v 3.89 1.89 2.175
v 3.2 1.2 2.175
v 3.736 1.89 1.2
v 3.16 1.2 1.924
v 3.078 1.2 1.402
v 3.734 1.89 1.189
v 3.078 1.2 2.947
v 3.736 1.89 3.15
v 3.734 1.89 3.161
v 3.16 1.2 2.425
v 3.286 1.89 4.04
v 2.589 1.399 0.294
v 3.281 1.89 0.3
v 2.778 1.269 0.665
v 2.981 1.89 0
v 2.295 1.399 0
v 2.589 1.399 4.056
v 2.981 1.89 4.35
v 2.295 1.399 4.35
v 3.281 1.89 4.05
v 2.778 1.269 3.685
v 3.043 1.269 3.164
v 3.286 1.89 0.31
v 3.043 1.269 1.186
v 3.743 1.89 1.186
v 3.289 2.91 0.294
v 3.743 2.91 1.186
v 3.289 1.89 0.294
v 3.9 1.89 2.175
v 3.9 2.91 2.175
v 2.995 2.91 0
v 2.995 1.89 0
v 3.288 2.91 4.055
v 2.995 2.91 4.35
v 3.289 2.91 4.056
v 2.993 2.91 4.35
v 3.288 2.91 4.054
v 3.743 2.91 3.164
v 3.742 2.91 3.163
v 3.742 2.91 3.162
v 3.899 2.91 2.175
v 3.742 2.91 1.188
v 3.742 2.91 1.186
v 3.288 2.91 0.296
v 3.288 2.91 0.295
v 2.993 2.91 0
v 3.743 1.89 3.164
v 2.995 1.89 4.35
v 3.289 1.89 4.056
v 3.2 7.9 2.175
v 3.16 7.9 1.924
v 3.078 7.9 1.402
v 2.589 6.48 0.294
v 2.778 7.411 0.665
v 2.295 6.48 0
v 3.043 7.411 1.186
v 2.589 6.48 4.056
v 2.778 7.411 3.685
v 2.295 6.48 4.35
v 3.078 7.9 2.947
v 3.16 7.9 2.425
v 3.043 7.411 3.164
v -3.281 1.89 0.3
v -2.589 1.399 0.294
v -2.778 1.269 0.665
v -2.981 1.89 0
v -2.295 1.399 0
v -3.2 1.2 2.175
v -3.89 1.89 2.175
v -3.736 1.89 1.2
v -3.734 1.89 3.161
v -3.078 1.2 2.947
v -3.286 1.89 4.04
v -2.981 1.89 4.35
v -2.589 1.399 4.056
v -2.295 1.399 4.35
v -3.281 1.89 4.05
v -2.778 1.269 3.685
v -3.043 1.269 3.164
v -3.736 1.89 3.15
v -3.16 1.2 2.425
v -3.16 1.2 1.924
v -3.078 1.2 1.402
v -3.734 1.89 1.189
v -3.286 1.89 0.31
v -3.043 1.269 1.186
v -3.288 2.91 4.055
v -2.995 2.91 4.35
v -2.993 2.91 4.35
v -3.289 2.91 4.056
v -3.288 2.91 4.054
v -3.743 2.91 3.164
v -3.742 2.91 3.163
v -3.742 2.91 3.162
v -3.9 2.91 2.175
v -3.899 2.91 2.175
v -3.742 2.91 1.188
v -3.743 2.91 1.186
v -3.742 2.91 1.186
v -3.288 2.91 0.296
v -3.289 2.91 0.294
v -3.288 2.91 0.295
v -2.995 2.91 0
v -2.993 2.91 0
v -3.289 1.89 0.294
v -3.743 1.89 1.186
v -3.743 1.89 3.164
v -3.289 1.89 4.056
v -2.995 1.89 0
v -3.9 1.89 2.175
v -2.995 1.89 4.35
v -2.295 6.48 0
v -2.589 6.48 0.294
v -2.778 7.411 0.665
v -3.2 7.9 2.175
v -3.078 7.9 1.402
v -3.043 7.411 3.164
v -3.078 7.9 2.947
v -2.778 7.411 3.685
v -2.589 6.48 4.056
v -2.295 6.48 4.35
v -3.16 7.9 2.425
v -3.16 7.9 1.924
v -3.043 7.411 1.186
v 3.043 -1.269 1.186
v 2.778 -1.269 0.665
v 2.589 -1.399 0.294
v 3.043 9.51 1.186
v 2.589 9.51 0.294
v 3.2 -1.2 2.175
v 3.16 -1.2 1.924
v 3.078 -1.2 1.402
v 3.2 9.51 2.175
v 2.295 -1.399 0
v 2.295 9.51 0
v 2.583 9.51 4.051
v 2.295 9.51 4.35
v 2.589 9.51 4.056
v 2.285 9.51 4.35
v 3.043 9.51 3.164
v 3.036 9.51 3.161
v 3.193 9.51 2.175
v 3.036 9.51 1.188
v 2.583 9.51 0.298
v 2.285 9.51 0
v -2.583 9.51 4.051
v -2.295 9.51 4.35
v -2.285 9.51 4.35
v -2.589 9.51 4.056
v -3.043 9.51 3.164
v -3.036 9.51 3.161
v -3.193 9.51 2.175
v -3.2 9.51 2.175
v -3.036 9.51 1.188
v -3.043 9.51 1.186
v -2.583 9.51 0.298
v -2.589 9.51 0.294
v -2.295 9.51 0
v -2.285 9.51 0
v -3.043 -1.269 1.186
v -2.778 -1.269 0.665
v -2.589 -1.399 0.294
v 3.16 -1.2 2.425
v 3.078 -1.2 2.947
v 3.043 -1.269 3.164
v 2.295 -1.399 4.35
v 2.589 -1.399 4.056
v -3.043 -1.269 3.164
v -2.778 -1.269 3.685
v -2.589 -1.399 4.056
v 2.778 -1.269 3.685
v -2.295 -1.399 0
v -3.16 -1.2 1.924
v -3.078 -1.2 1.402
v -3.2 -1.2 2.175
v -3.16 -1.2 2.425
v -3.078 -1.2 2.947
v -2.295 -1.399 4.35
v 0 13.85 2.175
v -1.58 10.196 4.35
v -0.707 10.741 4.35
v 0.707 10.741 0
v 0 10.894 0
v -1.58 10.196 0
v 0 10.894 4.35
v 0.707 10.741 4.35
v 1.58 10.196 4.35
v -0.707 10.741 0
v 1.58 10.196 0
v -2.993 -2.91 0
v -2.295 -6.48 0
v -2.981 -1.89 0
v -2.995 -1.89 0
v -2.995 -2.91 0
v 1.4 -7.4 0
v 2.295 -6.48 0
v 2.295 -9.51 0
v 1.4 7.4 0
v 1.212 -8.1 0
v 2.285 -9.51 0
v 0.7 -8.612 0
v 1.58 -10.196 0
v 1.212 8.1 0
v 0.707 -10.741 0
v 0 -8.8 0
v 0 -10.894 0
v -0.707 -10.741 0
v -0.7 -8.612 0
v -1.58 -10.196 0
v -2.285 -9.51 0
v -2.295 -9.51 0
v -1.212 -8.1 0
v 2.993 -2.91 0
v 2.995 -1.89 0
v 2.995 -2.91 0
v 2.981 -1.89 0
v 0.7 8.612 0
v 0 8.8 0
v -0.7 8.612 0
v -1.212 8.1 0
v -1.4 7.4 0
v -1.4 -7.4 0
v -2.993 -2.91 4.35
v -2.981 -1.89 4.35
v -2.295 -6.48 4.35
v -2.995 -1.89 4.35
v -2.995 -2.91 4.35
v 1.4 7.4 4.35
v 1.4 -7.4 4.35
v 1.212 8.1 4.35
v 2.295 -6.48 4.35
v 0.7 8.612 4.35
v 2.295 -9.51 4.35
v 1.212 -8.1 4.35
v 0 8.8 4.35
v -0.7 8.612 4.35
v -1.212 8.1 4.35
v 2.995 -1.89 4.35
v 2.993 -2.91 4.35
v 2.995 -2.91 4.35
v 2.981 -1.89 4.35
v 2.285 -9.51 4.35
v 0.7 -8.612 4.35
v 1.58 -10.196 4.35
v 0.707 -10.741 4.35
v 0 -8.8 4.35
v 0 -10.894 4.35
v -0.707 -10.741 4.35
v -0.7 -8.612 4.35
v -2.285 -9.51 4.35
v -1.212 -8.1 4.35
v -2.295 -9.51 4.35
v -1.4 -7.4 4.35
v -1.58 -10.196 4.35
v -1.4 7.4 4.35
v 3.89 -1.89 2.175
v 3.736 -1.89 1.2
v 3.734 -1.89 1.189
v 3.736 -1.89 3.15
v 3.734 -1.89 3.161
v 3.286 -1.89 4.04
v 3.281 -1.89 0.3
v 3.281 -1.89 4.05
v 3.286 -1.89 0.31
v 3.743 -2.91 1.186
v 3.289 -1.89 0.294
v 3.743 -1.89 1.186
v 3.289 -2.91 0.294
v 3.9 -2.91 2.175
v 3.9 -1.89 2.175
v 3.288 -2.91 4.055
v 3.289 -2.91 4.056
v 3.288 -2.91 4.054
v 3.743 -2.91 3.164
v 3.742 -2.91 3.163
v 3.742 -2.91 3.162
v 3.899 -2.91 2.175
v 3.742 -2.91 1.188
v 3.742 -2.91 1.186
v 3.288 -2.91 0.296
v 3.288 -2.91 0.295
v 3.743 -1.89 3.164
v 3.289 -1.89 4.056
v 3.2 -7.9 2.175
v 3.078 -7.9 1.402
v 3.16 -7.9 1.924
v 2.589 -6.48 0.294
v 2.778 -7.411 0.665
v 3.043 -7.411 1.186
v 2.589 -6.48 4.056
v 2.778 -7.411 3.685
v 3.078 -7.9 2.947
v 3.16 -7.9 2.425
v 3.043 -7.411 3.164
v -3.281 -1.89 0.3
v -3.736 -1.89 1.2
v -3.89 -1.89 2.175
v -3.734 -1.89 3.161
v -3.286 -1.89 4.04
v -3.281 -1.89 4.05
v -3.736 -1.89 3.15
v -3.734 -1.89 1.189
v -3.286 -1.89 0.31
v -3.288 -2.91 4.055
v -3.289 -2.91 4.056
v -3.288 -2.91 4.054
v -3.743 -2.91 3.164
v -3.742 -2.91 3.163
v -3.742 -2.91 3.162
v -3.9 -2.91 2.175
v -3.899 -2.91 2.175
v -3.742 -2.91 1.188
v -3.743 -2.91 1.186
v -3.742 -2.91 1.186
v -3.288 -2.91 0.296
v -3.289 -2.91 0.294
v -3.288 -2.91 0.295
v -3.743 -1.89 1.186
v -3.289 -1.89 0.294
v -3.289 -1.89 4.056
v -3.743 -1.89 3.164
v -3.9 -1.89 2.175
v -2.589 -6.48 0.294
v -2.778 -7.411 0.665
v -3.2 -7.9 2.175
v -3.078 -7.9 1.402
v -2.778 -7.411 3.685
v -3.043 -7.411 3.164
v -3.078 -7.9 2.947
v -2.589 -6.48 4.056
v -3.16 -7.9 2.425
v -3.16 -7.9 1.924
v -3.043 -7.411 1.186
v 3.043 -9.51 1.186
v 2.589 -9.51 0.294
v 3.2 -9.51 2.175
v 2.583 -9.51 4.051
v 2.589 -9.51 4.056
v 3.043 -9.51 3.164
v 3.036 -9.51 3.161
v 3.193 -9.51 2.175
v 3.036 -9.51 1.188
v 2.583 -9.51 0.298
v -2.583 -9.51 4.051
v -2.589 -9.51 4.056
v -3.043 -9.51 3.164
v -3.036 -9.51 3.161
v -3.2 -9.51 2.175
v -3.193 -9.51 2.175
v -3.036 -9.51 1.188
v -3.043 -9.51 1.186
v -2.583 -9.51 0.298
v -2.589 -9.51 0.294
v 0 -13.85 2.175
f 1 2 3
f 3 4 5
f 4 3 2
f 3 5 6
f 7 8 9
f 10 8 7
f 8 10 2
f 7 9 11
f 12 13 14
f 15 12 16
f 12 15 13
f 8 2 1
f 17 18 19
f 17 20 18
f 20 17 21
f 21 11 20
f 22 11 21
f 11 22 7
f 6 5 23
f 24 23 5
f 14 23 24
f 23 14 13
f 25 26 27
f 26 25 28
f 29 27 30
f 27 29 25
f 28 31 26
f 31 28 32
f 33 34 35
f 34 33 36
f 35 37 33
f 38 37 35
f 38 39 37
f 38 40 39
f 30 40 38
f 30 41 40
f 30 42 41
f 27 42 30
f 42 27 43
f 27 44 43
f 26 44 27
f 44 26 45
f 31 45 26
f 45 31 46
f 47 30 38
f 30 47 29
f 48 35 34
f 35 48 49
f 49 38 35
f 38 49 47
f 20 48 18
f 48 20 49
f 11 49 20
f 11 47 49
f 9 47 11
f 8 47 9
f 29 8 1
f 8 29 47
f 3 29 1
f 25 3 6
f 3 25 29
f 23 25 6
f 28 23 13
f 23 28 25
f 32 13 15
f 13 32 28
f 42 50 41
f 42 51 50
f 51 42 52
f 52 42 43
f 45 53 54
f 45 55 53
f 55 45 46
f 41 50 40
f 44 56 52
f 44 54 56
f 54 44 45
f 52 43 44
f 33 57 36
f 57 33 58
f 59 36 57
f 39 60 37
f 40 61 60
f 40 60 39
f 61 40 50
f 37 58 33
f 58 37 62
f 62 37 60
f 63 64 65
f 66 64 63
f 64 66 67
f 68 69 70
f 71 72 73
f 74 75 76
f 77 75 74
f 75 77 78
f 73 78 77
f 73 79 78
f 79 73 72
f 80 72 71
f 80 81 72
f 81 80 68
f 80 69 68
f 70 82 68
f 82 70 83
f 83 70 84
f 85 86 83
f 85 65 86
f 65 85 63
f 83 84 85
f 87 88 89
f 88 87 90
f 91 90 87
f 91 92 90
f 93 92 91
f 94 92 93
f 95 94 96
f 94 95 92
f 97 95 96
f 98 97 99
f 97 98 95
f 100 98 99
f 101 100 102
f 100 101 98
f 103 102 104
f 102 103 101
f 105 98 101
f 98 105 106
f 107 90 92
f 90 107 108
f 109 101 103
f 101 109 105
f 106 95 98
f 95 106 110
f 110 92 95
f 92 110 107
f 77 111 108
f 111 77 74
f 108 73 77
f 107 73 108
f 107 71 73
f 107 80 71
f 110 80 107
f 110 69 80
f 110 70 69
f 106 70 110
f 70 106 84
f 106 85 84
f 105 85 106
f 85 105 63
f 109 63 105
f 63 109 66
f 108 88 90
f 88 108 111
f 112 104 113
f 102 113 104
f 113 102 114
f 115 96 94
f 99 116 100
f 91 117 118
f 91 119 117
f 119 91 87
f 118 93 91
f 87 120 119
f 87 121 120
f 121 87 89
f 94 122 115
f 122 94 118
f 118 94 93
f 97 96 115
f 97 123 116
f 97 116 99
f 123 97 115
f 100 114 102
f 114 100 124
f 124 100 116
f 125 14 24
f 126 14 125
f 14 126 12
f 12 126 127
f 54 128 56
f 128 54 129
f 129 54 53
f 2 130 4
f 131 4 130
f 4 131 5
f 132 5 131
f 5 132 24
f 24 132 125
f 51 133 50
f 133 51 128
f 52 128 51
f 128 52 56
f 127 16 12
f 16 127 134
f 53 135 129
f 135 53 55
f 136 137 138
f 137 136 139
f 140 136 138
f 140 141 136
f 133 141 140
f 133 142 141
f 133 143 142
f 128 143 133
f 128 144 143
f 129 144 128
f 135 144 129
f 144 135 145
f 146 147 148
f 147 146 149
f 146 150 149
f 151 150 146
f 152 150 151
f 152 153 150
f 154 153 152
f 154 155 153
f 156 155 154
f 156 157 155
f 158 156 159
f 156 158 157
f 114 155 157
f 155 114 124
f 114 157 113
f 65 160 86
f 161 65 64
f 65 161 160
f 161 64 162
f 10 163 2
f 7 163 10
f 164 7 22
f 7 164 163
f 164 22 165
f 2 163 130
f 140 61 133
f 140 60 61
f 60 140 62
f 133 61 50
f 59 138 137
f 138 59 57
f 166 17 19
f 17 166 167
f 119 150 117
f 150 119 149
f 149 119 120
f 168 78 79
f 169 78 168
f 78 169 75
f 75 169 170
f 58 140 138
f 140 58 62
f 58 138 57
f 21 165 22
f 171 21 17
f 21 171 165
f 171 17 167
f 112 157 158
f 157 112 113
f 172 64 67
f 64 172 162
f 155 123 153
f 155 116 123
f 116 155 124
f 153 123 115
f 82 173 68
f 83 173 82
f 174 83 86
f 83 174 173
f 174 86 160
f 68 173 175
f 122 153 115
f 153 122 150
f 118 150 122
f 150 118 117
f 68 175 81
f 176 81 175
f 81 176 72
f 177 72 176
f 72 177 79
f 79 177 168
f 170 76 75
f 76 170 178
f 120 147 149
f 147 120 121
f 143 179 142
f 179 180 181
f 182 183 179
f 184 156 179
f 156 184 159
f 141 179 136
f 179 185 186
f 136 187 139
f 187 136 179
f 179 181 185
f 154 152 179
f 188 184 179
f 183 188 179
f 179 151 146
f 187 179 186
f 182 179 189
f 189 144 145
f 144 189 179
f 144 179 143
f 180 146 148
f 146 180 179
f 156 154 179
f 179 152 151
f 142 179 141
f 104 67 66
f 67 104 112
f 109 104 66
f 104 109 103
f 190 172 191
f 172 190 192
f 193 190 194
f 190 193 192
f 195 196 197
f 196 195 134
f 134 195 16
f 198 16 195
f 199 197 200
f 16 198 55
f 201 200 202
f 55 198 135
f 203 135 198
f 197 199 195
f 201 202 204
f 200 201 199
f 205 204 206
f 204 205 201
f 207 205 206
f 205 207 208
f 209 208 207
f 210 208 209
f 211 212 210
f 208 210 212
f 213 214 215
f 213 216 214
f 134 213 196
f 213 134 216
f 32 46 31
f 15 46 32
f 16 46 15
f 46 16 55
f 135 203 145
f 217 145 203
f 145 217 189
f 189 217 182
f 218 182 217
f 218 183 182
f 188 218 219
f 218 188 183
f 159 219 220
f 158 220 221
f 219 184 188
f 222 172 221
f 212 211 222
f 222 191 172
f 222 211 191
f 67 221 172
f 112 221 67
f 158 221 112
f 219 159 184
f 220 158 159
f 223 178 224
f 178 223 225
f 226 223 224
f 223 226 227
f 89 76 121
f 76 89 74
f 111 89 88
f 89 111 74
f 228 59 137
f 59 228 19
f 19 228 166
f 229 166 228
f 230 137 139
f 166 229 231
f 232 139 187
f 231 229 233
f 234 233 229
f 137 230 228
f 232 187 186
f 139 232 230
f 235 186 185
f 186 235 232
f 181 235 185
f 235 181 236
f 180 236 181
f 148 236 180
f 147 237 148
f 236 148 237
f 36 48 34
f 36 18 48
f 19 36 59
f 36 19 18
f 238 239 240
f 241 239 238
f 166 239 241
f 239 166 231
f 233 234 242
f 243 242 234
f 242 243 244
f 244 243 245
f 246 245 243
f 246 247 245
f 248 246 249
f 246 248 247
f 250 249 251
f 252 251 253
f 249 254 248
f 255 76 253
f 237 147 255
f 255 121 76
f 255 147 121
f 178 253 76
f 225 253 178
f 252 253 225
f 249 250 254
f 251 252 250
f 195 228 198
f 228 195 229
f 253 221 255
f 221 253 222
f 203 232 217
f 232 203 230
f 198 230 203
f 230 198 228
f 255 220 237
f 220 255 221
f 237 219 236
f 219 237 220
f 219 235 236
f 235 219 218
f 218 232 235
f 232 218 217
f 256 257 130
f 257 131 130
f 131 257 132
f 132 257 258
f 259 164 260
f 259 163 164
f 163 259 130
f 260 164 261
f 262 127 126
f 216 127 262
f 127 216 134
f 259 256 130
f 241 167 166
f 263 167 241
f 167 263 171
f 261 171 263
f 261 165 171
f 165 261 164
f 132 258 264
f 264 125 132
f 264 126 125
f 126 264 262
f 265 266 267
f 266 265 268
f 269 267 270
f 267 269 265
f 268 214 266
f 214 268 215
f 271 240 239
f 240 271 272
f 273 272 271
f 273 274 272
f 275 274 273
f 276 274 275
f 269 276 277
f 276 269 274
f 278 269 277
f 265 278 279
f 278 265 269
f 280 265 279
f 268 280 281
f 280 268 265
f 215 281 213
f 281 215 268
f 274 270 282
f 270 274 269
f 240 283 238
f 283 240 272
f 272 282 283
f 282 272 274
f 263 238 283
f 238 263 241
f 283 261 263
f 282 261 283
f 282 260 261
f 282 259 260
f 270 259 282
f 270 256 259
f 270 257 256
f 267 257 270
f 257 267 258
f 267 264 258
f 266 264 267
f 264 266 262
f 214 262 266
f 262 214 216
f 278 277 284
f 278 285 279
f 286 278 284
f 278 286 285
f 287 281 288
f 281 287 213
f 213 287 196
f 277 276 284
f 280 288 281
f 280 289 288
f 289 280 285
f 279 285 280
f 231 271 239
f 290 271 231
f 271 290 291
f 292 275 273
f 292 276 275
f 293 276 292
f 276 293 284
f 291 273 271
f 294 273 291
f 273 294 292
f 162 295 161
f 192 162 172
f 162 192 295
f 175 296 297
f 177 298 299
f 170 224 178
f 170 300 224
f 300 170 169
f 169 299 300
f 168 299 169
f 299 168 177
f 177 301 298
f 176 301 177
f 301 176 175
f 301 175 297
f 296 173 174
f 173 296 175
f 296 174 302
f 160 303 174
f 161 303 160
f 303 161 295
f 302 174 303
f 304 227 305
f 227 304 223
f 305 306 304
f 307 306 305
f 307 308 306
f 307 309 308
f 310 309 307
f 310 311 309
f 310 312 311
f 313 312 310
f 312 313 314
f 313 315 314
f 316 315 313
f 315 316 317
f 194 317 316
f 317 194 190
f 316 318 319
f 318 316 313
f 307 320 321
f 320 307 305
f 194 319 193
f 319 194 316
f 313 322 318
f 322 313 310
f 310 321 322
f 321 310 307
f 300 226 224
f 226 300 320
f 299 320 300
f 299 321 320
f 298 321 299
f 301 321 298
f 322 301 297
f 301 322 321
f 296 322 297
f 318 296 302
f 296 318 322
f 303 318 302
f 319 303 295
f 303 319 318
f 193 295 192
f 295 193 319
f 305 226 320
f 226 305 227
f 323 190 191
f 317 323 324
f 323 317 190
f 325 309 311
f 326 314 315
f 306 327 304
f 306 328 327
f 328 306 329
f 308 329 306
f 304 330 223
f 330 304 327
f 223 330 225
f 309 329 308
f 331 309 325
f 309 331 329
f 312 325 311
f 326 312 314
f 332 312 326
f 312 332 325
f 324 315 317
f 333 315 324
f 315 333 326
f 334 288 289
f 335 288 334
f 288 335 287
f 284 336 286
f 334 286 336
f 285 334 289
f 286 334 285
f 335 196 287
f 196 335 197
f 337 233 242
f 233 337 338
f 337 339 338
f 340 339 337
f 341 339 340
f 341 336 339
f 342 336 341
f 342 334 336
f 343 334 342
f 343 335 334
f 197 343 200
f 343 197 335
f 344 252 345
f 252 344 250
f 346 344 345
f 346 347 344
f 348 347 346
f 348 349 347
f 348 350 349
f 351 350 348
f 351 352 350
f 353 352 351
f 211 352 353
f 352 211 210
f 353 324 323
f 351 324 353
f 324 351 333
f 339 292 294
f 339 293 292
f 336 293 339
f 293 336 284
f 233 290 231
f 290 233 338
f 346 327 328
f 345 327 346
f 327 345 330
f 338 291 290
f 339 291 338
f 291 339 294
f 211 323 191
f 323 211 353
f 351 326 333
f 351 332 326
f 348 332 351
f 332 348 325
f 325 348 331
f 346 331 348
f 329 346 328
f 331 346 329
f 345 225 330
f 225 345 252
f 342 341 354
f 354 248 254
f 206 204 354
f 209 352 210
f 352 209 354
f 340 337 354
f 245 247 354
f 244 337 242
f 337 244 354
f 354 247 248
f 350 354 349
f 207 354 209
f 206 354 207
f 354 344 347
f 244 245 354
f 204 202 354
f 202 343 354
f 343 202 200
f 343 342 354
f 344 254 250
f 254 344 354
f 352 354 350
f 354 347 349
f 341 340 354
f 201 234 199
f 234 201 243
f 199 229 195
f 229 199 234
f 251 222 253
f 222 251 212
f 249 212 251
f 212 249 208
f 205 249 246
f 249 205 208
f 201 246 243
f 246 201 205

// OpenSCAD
// new pin connectors

object=0;//[0:Pinpeg,1:Pinhole]
//Pinpeg is twice this length
length=14;
//Of hole; pinpeg is smaller to fit
diameter=7;
//Only affects pinhole
hole_twist=0;//[0:free,1:fixed]
//Pulls the snaps together on the pinpeg to ensure a tight coupling
preload=0.1;
//Allows pins to fit easily into holes
clearance=0.3;
//Thicker makes the pinpeg stiffer
thickness=1.8;
//Height of snap nubs
snap=0.4;
//Put fins on pinhole to help with printing strength
fins=1;//[1:yes,0:no]

$fn=20;

if(object==0)pinpeg(r=diameter/2,l=length,d=2.5-preload,nub=snap,t=thickness,space=clearance);
if(object==1)pinhole(r=diameter/2,l=length,nub=snap,fixed=hole_twist,fins=fins);

//pin(flat=0);
//%pinhole(fixed=true);

//pinpeg();
//translate([10,0,0])difference(){
//	cylinder(r=5.5,h=14);
//	pinhole(fixed=true);
//}
//translate([-10,0,0])difference(){
//	cylinder(r=5.5,h=14);
//	pinhole(fixed=false);
//}

module pin(r=3.5,l=13,d=2.4,slot=10,nub=0.4,t=1.8,space=0.3,flat=1)
{
translate(flat*[0,0,r/sqrt(2)-space])rotate((1-flat)*[90,0,0])
difference(){
	rotate([-90,0,0])intersection(){
		union(){
			translate([0,0,-0.01])cylinder(r=r-space,h=l-r-0.98);
			translate([0,0,l-r-1])cylinder(r1=r-space,r2=0,h=r-space/2+1);
			translate([nub+space,0,d])nub(r-space,nub+space);
			translate([-nub-space,0,d])nub(r-space,nub+space);
		}
		cube([3*r,r*sqrt(2)-2*space,2*l+3*r],center=true);
	}
	translate([0,d,0])cube([2*(r-t-space),slot,2*r],center=true);
	translate([0,d-slot/2,0])cylinder(r=r-t-space,h=2*r,center=true,$fn=12);
	translate([0,d+slot/2,0])cylinder(r=r-t-space,h=2*r,center=true,$fn=12);
}
}

module nub(r,nub)
{
union(){
	translate([0,0,-nub-0.5])cylinder(r1=r-nub,r2=r,h=nub);
	cylinder(r=r,h=1.02,center=true);
	translate([0,0,0.5])cylinder(r1=r,r2=r-nub,h=5);
}

module pinhole(r=3.5,l=13,d=2.5,nub=0.4,fixed=false,fins=true)
intersection(){
	union(){
		translate([0,0,-0.1])cylinder(r=r,h=l-r+0.1);
		translate([0,0,l-r-0.01])cylinder(r1=r,r2=0,h=r);
		translate([0,0,d])nub(r+nub,nub);
		if(fins)translate([0,0,l-r]){
			cube([2*r,0.01,2*r],center=true);
			cube([0.01,2*r,2*r],center=true);
		}
	}
	if(fixed)cube([3*r,r*sqrt(2),2*l+3*r],center=true);
}
}

module pinpeg(r=3.5,l=13,d=2.4,nub=0.4,t=1.8,space=0.3)
{
union(){
	pin(r=r,l=l,d=d,nub=nub,t=t,space=space,flat=1);
	mirror([0,1,0])pin(r=r,l=l,d=d,nub=nub,t=t,space=space,flat=1);
}
}
